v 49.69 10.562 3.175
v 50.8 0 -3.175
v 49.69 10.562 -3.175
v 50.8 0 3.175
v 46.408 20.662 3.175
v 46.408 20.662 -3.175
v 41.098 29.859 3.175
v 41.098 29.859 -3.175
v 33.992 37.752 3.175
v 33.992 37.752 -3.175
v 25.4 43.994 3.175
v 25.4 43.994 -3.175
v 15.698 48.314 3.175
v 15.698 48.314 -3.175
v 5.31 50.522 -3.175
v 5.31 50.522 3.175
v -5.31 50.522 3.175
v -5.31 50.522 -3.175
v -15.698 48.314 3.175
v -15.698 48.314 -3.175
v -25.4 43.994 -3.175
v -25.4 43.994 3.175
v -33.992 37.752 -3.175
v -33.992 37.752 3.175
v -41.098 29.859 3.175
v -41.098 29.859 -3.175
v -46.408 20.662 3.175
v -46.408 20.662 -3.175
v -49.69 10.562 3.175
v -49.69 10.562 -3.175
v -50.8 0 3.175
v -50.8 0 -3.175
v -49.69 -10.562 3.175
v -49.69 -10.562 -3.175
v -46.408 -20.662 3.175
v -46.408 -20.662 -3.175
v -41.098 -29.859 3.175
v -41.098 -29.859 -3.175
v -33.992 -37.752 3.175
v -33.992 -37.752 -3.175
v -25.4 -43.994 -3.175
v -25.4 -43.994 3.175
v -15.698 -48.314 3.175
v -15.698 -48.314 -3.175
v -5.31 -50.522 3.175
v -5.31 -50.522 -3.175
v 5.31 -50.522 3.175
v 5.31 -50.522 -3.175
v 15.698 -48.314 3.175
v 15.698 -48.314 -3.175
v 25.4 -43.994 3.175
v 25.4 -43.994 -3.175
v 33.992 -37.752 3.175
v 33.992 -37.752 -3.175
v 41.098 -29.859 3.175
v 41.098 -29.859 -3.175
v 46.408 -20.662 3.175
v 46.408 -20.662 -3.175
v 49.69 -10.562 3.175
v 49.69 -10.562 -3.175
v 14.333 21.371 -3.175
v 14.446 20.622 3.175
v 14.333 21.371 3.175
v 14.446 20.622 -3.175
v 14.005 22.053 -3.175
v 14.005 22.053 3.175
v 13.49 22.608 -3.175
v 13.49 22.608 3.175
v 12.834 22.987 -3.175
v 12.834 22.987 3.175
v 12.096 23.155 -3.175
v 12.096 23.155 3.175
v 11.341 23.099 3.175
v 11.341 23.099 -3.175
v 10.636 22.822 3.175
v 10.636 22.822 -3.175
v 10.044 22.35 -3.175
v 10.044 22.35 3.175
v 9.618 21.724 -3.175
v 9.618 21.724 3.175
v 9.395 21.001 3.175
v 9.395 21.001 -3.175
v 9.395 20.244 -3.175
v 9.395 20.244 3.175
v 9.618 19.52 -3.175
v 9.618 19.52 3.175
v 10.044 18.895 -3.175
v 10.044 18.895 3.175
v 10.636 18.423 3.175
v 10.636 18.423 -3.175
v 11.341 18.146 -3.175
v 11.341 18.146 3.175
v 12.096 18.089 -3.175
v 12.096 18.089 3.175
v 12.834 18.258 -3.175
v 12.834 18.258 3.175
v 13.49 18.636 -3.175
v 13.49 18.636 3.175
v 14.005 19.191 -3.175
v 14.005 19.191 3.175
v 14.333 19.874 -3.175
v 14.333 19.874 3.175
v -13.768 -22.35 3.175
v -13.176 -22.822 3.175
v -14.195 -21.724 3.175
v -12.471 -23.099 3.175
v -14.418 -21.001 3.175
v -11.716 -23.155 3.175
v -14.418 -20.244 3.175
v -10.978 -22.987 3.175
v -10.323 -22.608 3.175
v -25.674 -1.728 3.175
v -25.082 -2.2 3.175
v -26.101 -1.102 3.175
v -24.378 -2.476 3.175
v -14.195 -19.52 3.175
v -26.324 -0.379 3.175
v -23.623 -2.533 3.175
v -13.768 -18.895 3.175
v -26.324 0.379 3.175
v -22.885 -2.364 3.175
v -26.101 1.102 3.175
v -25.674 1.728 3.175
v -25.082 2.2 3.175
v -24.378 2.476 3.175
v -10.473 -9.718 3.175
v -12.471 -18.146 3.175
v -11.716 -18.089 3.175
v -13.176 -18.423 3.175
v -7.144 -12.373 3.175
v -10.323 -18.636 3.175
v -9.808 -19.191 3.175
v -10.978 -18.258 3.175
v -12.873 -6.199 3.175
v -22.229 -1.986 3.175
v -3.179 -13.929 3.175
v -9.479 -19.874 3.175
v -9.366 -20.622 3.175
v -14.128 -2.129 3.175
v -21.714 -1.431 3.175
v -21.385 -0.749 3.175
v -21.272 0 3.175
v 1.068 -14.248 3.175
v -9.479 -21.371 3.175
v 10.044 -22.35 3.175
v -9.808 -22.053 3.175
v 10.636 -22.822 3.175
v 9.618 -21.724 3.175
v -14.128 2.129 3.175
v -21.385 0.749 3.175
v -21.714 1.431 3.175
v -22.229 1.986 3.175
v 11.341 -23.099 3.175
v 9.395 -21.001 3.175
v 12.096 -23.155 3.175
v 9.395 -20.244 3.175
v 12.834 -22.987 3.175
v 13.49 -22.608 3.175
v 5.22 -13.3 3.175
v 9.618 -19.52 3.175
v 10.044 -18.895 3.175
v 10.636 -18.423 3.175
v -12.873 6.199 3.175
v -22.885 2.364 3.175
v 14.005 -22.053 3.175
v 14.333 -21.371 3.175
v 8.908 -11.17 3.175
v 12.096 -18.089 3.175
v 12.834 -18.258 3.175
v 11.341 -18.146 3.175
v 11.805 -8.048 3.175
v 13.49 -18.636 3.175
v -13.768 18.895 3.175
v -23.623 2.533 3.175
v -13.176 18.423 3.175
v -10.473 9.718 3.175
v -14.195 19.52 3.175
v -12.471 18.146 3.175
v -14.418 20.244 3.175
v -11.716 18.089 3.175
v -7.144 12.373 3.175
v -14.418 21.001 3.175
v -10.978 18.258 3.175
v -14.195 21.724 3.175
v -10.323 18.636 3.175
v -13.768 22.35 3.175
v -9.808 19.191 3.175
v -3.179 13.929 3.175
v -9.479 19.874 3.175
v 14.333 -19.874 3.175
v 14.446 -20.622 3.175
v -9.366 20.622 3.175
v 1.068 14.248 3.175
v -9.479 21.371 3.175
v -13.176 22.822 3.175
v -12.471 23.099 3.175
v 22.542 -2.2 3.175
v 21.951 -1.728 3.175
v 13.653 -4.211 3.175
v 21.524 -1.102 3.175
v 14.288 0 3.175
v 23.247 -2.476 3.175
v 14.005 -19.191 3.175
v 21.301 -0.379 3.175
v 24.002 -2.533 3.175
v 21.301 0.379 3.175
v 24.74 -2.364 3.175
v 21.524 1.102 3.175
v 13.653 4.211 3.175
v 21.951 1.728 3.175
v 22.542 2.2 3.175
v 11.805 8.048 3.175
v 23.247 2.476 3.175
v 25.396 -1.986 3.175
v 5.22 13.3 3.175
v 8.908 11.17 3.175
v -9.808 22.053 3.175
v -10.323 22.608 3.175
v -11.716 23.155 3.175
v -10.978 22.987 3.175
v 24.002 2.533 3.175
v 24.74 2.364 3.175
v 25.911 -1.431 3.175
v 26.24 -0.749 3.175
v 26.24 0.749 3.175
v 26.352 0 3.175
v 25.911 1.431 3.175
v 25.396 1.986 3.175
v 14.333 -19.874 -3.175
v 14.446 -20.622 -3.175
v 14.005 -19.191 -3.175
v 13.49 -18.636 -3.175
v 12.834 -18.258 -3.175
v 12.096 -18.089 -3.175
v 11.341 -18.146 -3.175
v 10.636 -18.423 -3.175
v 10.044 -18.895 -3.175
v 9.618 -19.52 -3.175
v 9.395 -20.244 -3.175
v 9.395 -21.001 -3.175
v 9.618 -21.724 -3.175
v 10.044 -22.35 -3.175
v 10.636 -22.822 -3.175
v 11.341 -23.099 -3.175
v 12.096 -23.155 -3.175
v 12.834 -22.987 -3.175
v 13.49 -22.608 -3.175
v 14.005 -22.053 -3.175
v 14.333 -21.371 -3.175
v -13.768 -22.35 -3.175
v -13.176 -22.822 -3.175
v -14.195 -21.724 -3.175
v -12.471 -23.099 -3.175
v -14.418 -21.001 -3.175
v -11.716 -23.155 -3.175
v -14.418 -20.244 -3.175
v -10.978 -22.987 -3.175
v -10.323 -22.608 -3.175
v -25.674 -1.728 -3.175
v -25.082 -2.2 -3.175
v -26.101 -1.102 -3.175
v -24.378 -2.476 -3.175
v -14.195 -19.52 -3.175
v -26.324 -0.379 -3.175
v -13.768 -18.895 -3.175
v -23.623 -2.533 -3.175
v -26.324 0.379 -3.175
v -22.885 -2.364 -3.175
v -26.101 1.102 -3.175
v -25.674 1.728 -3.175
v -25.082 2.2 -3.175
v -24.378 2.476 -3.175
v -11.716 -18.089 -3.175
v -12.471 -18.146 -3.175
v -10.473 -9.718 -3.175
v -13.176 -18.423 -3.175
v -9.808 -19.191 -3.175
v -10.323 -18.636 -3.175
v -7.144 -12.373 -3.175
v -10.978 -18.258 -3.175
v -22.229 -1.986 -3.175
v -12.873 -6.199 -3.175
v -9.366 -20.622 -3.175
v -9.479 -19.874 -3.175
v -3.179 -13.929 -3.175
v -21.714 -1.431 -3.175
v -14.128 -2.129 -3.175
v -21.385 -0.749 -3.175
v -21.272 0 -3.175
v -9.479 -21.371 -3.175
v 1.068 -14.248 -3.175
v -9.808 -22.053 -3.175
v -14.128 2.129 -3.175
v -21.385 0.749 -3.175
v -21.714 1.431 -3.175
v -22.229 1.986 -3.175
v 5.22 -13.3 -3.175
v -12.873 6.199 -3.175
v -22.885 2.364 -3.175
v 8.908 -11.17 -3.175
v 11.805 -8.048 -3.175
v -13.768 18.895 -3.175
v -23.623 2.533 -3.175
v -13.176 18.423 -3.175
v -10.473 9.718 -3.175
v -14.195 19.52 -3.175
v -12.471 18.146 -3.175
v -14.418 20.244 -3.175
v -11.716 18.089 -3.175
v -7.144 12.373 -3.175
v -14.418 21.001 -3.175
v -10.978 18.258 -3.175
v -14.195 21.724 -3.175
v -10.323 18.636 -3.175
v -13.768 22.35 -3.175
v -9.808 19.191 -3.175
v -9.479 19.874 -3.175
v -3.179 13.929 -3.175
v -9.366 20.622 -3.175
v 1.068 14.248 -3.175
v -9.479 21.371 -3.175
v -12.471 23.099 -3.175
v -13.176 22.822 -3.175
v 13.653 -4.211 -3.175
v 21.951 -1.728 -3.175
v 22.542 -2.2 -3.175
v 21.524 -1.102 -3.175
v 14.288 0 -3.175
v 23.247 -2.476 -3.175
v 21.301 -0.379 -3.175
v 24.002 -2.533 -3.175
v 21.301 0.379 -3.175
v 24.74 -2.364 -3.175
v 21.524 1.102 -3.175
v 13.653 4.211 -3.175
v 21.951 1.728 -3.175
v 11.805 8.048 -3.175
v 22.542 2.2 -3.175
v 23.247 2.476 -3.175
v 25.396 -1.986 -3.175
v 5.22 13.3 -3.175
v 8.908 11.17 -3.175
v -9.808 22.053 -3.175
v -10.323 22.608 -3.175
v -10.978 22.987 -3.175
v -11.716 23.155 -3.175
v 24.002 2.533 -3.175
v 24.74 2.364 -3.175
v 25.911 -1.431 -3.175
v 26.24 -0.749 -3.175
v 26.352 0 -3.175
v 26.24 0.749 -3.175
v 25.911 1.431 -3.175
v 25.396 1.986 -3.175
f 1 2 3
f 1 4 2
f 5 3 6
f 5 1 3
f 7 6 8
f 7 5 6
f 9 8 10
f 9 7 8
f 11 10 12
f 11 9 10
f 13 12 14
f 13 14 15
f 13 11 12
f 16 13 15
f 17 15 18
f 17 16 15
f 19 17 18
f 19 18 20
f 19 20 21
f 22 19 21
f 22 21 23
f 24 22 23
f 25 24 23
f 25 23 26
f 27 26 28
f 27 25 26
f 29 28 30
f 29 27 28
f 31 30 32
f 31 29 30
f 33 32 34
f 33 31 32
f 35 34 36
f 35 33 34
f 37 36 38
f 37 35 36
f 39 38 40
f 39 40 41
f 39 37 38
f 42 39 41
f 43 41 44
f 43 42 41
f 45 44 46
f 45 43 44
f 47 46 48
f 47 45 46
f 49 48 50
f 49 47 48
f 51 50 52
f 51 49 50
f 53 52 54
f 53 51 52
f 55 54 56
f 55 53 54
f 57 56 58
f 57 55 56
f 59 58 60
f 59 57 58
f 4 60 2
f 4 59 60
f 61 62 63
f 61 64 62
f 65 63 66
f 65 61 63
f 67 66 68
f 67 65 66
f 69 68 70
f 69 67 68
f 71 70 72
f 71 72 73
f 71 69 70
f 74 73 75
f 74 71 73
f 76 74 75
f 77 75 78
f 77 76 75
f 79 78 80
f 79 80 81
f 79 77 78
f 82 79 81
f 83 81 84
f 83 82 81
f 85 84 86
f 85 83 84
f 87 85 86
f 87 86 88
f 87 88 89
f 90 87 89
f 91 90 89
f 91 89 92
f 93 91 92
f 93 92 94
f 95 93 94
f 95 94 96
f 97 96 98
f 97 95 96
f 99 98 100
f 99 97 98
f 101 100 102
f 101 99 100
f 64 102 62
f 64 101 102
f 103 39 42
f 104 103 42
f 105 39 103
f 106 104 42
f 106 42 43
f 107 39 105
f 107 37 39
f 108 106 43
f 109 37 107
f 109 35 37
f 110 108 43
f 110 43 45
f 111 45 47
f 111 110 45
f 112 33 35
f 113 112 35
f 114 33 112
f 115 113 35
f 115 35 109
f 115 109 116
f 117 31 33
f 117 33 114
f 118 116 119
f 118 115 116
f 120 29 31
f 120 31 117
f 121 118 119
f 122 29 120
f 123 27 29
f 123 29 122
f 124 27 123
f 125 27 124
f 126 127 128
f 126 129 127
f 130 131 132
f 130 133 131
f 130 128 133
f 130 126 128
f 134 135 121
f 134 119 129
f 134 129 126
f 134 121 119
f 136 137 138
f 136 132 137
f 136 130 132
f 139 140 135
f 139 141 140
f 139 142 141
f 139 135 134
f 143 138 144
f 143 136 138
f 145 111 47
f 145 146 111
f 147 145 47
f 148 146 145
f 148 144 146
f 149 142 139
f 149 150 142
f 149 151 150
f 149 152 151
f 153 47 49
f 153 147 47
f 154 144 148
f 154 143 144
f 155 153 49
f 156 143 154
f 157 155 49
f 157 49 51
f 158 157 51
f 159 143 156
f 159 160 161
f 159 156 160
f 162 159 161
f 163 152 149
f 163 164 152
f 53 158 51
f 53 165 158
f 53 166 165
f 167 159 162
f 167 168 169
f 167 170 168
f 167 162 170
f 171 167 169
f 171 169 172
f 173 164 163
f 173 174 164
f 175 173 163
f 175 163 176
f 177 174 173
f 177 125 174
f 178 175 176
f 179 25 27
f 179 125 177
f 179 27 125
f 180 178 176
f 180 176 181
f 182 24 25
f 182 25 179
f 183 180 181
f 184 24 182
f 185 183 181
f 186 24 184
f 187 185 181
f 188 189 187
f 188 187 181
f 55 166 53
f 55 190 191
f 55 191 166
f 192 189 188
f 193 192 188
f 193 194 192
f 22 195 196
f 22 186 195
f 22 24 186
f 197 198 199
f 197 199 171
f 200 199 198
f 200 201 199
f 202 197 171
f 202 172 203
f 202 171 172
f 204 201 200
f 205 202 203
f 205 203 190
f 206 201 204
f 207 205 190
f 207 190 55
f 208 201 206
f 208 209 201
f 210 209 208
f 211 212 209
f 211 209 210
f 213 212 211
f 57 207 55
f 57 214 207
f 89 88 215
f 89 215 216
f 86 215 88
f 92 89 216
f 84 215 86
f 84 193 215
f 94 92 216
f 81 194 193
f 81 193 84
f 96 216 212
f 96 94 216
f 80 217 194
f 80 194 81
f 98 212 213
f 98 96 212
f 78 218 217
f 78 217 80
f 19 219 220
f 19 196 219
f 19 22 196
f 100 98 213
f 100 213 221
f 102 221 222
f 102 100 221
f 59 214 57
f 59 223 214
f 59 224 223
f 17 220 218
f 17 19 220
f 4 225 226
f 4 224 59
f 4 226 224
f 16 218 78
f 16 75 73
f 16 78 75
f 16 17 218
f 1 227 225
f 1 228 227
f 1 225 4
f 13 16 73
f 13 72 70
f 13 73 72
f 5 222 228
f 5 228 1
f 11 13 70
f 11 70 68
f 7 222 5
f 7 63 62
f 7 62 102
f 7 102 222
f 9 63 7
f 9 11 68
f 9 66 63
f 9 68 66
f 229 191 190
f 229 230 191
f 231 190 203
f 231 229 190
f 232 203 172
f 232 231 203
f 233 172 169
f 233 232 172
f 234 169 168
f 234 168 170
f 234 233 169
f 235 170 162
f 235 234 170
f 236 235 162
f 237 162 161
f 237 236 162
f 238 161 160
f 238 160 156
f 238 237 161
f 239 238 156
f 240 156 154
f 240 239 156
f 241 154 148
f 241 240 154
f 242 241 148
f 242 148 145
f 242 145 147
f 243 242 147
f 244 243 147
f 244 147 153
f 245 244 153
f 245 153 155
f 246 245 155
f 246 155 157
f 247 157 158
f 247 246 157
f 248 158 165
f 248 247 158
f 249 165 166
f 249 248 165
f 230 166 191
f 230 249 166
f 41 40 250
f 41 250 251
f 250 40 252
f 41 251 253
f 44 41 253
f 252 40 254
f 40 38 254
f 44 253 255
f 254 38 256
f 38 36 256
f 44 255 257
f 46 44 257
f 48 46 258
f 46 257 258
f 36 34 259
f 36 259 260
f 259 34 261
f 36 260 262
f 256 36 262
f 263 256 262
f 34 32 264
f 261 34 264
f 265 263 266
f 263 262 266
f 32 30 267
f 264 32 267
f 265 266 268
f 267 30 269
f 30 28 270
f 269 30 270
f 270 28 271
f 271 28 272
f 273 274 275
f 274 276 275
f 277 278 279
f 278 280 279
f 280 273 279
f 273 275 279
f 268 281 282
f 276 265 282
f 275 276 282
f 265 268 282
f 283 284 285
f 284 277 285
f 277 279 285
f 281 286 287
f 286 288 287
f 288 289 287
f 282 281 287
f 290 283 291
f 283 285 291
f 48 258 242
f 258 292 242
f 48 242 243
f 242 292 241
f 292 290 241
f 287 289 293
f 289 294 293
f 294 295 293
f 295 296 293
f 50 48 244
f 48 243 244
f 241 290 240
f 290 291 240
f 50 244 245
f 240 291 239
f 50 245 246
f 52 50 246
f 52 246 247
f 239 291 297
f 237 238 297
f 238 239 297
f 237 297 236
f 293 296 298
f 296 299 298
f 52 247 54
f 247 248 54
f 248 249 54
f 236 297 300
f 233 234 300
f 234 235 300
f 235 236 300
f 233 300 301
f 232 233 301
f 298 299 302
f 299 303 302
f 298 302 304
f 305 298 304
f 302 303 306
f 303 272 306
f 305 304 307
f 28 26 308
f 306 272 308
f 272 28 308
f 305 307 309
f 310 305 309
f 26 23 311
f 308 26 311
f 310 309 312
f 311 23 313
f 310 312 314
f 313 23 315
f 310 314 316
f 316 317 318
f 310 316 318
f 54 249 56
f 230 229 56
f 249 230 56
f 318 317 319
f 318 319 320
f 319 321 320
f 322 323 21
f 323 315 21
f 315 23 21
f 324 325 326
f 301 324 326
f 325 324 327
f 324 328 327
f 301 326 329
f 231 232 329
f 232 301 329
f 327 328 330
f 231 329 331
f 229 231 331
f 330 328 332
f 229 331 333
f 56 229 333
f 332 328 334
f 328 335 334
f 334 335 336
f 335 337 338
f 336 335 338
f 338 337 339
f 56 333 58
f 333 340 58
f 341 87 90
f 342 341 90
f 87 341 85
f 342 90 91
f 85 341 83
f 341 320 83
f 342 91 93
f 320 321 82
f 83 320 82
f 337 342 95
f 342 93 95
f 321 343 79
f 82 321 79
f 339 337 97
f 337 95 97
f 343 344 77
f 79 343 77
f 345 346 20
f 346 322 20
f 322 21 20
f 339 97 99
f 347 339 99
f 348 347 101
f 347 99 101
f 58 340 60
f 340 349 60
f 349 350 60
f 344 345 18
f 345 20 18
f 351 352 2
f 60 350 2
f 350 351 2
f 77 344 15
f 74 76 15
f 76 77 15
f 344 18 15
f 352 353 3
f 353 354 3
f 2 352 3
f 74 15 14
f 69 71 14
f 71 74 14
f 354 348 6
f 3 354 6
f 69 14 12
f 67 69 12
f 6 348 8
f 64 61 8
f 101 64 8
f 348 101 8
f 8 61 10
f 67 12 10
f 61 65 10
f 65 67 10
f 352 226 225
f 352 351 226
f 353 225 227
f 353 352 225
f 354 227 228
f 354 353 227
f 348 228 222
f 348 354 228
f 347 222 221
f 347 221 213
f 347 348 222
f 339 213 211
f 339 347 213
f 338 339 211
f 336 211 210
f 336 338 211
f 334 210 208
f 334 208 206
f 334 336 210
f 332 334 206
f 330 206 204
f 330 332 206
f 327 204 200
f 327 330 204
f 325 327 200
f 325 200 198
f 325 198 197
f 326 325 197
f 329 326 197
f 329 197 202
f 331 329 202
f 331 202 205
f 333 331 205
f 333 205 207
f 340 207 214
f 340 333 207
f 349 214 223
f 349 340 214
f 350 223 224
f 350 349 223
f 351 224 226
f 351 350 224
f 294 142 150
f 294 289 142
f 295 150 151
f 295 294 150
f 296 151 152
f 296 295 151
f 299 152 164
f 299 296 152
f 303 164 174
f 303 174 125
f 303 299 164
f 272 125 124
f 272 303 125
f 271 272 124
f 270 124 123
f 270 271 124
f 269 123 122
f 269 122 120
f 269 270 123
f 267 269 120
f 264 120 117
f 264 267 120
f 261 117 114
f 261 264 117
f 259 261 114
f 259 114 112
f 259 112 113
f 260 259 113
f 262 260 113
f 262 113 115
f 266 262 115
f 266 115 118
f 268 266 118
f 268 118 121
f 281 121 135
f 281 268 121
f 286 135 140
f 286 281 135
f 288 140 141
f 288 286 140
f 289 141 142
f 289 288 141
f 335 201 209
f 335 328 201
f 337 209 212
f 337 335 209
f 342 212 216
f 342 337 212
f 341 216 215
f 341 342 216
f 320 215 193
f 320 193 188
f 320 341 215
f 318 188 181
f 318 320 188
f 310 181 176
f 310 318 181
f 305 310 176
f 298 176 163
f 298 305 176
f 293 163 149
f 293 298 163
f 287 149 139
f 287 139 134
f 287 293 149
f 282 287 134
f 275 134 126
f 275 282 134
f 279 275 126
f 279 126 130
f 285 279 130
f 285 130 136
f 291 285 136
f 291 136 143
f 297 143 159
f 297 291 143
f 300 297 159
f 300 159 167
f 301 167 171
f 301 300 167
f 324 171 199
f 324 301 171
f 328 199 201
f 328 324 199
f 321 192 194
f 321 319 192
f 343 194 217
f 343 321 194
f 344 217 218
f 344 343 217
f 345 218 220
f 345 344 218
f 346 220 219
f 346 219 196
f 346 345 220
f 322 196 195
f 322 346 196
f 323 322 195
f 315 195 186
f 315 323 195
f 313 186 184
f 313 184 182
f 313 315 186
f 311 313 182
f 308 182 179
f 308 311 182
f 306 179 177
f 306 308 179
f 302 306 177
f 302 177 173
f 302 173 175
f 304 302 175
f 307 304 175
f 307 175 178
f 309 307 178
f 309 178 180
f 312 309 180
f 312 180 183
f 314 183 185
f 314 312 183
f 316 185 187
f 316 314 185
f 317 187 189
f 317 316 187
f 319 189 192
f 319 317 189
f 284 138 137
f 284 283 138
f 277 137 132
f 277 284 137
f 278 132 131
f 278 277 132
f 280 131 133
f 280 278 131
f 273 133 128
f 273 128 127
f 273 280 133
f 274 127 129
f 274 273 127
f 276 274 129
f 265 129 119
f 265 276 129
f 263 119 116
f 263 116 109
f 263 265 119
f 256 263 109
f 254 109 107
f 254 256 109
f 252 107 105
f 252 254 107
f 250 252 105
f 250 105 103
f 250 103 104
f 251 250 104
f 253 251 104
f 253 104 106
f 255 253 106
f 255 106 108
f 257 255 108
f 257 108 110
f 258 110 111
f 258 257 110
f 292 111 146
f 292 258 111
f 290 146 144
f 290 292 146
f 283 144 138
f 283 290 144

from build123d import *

# Parameters (mm, degrees)
F0_R     = 50.8
F0_R_2   = 2.54
F0_R_3   = 14.2875
F1_DEPTH = 3.175


with BuildPart() as f1:
    # F0 (on Top) → F1 (new body, symmetric)
    with BuildSketch(Plane.XY):
        Circle(F0_R)
        with Locations((-11.90625, -20.6222299276)):
            Circle(F0_R_2, mode=Mode.SUBTRACT)
        with Locations((-23.8125, 0)):
            Circle(F0_R_2, mode=Mode.SUBTRACT)
        Circle(F0_R_3, mode=Mode.SUBTRACT)
        with Locations((11.90625, -20.6222299276)):
            Circle(F0_R_2, mode=Mode.SUBTRACT)
        with Locations((23.8125, 0)):
            Circle(F0_R_2, mode=Mode.SUBTRACT)
        with Locations((-11.90625, 20.6222299276)):
            Circle(F0_R_2, mode=Mode.SUBTRACT)
        with Locations((11.90625, 20.6222299276)):
            Circle(F0_R_2, mode=Mode.SUBTRACT)
    extrude(amount=F1_DEPTH, both=True)


solid = f1.part
